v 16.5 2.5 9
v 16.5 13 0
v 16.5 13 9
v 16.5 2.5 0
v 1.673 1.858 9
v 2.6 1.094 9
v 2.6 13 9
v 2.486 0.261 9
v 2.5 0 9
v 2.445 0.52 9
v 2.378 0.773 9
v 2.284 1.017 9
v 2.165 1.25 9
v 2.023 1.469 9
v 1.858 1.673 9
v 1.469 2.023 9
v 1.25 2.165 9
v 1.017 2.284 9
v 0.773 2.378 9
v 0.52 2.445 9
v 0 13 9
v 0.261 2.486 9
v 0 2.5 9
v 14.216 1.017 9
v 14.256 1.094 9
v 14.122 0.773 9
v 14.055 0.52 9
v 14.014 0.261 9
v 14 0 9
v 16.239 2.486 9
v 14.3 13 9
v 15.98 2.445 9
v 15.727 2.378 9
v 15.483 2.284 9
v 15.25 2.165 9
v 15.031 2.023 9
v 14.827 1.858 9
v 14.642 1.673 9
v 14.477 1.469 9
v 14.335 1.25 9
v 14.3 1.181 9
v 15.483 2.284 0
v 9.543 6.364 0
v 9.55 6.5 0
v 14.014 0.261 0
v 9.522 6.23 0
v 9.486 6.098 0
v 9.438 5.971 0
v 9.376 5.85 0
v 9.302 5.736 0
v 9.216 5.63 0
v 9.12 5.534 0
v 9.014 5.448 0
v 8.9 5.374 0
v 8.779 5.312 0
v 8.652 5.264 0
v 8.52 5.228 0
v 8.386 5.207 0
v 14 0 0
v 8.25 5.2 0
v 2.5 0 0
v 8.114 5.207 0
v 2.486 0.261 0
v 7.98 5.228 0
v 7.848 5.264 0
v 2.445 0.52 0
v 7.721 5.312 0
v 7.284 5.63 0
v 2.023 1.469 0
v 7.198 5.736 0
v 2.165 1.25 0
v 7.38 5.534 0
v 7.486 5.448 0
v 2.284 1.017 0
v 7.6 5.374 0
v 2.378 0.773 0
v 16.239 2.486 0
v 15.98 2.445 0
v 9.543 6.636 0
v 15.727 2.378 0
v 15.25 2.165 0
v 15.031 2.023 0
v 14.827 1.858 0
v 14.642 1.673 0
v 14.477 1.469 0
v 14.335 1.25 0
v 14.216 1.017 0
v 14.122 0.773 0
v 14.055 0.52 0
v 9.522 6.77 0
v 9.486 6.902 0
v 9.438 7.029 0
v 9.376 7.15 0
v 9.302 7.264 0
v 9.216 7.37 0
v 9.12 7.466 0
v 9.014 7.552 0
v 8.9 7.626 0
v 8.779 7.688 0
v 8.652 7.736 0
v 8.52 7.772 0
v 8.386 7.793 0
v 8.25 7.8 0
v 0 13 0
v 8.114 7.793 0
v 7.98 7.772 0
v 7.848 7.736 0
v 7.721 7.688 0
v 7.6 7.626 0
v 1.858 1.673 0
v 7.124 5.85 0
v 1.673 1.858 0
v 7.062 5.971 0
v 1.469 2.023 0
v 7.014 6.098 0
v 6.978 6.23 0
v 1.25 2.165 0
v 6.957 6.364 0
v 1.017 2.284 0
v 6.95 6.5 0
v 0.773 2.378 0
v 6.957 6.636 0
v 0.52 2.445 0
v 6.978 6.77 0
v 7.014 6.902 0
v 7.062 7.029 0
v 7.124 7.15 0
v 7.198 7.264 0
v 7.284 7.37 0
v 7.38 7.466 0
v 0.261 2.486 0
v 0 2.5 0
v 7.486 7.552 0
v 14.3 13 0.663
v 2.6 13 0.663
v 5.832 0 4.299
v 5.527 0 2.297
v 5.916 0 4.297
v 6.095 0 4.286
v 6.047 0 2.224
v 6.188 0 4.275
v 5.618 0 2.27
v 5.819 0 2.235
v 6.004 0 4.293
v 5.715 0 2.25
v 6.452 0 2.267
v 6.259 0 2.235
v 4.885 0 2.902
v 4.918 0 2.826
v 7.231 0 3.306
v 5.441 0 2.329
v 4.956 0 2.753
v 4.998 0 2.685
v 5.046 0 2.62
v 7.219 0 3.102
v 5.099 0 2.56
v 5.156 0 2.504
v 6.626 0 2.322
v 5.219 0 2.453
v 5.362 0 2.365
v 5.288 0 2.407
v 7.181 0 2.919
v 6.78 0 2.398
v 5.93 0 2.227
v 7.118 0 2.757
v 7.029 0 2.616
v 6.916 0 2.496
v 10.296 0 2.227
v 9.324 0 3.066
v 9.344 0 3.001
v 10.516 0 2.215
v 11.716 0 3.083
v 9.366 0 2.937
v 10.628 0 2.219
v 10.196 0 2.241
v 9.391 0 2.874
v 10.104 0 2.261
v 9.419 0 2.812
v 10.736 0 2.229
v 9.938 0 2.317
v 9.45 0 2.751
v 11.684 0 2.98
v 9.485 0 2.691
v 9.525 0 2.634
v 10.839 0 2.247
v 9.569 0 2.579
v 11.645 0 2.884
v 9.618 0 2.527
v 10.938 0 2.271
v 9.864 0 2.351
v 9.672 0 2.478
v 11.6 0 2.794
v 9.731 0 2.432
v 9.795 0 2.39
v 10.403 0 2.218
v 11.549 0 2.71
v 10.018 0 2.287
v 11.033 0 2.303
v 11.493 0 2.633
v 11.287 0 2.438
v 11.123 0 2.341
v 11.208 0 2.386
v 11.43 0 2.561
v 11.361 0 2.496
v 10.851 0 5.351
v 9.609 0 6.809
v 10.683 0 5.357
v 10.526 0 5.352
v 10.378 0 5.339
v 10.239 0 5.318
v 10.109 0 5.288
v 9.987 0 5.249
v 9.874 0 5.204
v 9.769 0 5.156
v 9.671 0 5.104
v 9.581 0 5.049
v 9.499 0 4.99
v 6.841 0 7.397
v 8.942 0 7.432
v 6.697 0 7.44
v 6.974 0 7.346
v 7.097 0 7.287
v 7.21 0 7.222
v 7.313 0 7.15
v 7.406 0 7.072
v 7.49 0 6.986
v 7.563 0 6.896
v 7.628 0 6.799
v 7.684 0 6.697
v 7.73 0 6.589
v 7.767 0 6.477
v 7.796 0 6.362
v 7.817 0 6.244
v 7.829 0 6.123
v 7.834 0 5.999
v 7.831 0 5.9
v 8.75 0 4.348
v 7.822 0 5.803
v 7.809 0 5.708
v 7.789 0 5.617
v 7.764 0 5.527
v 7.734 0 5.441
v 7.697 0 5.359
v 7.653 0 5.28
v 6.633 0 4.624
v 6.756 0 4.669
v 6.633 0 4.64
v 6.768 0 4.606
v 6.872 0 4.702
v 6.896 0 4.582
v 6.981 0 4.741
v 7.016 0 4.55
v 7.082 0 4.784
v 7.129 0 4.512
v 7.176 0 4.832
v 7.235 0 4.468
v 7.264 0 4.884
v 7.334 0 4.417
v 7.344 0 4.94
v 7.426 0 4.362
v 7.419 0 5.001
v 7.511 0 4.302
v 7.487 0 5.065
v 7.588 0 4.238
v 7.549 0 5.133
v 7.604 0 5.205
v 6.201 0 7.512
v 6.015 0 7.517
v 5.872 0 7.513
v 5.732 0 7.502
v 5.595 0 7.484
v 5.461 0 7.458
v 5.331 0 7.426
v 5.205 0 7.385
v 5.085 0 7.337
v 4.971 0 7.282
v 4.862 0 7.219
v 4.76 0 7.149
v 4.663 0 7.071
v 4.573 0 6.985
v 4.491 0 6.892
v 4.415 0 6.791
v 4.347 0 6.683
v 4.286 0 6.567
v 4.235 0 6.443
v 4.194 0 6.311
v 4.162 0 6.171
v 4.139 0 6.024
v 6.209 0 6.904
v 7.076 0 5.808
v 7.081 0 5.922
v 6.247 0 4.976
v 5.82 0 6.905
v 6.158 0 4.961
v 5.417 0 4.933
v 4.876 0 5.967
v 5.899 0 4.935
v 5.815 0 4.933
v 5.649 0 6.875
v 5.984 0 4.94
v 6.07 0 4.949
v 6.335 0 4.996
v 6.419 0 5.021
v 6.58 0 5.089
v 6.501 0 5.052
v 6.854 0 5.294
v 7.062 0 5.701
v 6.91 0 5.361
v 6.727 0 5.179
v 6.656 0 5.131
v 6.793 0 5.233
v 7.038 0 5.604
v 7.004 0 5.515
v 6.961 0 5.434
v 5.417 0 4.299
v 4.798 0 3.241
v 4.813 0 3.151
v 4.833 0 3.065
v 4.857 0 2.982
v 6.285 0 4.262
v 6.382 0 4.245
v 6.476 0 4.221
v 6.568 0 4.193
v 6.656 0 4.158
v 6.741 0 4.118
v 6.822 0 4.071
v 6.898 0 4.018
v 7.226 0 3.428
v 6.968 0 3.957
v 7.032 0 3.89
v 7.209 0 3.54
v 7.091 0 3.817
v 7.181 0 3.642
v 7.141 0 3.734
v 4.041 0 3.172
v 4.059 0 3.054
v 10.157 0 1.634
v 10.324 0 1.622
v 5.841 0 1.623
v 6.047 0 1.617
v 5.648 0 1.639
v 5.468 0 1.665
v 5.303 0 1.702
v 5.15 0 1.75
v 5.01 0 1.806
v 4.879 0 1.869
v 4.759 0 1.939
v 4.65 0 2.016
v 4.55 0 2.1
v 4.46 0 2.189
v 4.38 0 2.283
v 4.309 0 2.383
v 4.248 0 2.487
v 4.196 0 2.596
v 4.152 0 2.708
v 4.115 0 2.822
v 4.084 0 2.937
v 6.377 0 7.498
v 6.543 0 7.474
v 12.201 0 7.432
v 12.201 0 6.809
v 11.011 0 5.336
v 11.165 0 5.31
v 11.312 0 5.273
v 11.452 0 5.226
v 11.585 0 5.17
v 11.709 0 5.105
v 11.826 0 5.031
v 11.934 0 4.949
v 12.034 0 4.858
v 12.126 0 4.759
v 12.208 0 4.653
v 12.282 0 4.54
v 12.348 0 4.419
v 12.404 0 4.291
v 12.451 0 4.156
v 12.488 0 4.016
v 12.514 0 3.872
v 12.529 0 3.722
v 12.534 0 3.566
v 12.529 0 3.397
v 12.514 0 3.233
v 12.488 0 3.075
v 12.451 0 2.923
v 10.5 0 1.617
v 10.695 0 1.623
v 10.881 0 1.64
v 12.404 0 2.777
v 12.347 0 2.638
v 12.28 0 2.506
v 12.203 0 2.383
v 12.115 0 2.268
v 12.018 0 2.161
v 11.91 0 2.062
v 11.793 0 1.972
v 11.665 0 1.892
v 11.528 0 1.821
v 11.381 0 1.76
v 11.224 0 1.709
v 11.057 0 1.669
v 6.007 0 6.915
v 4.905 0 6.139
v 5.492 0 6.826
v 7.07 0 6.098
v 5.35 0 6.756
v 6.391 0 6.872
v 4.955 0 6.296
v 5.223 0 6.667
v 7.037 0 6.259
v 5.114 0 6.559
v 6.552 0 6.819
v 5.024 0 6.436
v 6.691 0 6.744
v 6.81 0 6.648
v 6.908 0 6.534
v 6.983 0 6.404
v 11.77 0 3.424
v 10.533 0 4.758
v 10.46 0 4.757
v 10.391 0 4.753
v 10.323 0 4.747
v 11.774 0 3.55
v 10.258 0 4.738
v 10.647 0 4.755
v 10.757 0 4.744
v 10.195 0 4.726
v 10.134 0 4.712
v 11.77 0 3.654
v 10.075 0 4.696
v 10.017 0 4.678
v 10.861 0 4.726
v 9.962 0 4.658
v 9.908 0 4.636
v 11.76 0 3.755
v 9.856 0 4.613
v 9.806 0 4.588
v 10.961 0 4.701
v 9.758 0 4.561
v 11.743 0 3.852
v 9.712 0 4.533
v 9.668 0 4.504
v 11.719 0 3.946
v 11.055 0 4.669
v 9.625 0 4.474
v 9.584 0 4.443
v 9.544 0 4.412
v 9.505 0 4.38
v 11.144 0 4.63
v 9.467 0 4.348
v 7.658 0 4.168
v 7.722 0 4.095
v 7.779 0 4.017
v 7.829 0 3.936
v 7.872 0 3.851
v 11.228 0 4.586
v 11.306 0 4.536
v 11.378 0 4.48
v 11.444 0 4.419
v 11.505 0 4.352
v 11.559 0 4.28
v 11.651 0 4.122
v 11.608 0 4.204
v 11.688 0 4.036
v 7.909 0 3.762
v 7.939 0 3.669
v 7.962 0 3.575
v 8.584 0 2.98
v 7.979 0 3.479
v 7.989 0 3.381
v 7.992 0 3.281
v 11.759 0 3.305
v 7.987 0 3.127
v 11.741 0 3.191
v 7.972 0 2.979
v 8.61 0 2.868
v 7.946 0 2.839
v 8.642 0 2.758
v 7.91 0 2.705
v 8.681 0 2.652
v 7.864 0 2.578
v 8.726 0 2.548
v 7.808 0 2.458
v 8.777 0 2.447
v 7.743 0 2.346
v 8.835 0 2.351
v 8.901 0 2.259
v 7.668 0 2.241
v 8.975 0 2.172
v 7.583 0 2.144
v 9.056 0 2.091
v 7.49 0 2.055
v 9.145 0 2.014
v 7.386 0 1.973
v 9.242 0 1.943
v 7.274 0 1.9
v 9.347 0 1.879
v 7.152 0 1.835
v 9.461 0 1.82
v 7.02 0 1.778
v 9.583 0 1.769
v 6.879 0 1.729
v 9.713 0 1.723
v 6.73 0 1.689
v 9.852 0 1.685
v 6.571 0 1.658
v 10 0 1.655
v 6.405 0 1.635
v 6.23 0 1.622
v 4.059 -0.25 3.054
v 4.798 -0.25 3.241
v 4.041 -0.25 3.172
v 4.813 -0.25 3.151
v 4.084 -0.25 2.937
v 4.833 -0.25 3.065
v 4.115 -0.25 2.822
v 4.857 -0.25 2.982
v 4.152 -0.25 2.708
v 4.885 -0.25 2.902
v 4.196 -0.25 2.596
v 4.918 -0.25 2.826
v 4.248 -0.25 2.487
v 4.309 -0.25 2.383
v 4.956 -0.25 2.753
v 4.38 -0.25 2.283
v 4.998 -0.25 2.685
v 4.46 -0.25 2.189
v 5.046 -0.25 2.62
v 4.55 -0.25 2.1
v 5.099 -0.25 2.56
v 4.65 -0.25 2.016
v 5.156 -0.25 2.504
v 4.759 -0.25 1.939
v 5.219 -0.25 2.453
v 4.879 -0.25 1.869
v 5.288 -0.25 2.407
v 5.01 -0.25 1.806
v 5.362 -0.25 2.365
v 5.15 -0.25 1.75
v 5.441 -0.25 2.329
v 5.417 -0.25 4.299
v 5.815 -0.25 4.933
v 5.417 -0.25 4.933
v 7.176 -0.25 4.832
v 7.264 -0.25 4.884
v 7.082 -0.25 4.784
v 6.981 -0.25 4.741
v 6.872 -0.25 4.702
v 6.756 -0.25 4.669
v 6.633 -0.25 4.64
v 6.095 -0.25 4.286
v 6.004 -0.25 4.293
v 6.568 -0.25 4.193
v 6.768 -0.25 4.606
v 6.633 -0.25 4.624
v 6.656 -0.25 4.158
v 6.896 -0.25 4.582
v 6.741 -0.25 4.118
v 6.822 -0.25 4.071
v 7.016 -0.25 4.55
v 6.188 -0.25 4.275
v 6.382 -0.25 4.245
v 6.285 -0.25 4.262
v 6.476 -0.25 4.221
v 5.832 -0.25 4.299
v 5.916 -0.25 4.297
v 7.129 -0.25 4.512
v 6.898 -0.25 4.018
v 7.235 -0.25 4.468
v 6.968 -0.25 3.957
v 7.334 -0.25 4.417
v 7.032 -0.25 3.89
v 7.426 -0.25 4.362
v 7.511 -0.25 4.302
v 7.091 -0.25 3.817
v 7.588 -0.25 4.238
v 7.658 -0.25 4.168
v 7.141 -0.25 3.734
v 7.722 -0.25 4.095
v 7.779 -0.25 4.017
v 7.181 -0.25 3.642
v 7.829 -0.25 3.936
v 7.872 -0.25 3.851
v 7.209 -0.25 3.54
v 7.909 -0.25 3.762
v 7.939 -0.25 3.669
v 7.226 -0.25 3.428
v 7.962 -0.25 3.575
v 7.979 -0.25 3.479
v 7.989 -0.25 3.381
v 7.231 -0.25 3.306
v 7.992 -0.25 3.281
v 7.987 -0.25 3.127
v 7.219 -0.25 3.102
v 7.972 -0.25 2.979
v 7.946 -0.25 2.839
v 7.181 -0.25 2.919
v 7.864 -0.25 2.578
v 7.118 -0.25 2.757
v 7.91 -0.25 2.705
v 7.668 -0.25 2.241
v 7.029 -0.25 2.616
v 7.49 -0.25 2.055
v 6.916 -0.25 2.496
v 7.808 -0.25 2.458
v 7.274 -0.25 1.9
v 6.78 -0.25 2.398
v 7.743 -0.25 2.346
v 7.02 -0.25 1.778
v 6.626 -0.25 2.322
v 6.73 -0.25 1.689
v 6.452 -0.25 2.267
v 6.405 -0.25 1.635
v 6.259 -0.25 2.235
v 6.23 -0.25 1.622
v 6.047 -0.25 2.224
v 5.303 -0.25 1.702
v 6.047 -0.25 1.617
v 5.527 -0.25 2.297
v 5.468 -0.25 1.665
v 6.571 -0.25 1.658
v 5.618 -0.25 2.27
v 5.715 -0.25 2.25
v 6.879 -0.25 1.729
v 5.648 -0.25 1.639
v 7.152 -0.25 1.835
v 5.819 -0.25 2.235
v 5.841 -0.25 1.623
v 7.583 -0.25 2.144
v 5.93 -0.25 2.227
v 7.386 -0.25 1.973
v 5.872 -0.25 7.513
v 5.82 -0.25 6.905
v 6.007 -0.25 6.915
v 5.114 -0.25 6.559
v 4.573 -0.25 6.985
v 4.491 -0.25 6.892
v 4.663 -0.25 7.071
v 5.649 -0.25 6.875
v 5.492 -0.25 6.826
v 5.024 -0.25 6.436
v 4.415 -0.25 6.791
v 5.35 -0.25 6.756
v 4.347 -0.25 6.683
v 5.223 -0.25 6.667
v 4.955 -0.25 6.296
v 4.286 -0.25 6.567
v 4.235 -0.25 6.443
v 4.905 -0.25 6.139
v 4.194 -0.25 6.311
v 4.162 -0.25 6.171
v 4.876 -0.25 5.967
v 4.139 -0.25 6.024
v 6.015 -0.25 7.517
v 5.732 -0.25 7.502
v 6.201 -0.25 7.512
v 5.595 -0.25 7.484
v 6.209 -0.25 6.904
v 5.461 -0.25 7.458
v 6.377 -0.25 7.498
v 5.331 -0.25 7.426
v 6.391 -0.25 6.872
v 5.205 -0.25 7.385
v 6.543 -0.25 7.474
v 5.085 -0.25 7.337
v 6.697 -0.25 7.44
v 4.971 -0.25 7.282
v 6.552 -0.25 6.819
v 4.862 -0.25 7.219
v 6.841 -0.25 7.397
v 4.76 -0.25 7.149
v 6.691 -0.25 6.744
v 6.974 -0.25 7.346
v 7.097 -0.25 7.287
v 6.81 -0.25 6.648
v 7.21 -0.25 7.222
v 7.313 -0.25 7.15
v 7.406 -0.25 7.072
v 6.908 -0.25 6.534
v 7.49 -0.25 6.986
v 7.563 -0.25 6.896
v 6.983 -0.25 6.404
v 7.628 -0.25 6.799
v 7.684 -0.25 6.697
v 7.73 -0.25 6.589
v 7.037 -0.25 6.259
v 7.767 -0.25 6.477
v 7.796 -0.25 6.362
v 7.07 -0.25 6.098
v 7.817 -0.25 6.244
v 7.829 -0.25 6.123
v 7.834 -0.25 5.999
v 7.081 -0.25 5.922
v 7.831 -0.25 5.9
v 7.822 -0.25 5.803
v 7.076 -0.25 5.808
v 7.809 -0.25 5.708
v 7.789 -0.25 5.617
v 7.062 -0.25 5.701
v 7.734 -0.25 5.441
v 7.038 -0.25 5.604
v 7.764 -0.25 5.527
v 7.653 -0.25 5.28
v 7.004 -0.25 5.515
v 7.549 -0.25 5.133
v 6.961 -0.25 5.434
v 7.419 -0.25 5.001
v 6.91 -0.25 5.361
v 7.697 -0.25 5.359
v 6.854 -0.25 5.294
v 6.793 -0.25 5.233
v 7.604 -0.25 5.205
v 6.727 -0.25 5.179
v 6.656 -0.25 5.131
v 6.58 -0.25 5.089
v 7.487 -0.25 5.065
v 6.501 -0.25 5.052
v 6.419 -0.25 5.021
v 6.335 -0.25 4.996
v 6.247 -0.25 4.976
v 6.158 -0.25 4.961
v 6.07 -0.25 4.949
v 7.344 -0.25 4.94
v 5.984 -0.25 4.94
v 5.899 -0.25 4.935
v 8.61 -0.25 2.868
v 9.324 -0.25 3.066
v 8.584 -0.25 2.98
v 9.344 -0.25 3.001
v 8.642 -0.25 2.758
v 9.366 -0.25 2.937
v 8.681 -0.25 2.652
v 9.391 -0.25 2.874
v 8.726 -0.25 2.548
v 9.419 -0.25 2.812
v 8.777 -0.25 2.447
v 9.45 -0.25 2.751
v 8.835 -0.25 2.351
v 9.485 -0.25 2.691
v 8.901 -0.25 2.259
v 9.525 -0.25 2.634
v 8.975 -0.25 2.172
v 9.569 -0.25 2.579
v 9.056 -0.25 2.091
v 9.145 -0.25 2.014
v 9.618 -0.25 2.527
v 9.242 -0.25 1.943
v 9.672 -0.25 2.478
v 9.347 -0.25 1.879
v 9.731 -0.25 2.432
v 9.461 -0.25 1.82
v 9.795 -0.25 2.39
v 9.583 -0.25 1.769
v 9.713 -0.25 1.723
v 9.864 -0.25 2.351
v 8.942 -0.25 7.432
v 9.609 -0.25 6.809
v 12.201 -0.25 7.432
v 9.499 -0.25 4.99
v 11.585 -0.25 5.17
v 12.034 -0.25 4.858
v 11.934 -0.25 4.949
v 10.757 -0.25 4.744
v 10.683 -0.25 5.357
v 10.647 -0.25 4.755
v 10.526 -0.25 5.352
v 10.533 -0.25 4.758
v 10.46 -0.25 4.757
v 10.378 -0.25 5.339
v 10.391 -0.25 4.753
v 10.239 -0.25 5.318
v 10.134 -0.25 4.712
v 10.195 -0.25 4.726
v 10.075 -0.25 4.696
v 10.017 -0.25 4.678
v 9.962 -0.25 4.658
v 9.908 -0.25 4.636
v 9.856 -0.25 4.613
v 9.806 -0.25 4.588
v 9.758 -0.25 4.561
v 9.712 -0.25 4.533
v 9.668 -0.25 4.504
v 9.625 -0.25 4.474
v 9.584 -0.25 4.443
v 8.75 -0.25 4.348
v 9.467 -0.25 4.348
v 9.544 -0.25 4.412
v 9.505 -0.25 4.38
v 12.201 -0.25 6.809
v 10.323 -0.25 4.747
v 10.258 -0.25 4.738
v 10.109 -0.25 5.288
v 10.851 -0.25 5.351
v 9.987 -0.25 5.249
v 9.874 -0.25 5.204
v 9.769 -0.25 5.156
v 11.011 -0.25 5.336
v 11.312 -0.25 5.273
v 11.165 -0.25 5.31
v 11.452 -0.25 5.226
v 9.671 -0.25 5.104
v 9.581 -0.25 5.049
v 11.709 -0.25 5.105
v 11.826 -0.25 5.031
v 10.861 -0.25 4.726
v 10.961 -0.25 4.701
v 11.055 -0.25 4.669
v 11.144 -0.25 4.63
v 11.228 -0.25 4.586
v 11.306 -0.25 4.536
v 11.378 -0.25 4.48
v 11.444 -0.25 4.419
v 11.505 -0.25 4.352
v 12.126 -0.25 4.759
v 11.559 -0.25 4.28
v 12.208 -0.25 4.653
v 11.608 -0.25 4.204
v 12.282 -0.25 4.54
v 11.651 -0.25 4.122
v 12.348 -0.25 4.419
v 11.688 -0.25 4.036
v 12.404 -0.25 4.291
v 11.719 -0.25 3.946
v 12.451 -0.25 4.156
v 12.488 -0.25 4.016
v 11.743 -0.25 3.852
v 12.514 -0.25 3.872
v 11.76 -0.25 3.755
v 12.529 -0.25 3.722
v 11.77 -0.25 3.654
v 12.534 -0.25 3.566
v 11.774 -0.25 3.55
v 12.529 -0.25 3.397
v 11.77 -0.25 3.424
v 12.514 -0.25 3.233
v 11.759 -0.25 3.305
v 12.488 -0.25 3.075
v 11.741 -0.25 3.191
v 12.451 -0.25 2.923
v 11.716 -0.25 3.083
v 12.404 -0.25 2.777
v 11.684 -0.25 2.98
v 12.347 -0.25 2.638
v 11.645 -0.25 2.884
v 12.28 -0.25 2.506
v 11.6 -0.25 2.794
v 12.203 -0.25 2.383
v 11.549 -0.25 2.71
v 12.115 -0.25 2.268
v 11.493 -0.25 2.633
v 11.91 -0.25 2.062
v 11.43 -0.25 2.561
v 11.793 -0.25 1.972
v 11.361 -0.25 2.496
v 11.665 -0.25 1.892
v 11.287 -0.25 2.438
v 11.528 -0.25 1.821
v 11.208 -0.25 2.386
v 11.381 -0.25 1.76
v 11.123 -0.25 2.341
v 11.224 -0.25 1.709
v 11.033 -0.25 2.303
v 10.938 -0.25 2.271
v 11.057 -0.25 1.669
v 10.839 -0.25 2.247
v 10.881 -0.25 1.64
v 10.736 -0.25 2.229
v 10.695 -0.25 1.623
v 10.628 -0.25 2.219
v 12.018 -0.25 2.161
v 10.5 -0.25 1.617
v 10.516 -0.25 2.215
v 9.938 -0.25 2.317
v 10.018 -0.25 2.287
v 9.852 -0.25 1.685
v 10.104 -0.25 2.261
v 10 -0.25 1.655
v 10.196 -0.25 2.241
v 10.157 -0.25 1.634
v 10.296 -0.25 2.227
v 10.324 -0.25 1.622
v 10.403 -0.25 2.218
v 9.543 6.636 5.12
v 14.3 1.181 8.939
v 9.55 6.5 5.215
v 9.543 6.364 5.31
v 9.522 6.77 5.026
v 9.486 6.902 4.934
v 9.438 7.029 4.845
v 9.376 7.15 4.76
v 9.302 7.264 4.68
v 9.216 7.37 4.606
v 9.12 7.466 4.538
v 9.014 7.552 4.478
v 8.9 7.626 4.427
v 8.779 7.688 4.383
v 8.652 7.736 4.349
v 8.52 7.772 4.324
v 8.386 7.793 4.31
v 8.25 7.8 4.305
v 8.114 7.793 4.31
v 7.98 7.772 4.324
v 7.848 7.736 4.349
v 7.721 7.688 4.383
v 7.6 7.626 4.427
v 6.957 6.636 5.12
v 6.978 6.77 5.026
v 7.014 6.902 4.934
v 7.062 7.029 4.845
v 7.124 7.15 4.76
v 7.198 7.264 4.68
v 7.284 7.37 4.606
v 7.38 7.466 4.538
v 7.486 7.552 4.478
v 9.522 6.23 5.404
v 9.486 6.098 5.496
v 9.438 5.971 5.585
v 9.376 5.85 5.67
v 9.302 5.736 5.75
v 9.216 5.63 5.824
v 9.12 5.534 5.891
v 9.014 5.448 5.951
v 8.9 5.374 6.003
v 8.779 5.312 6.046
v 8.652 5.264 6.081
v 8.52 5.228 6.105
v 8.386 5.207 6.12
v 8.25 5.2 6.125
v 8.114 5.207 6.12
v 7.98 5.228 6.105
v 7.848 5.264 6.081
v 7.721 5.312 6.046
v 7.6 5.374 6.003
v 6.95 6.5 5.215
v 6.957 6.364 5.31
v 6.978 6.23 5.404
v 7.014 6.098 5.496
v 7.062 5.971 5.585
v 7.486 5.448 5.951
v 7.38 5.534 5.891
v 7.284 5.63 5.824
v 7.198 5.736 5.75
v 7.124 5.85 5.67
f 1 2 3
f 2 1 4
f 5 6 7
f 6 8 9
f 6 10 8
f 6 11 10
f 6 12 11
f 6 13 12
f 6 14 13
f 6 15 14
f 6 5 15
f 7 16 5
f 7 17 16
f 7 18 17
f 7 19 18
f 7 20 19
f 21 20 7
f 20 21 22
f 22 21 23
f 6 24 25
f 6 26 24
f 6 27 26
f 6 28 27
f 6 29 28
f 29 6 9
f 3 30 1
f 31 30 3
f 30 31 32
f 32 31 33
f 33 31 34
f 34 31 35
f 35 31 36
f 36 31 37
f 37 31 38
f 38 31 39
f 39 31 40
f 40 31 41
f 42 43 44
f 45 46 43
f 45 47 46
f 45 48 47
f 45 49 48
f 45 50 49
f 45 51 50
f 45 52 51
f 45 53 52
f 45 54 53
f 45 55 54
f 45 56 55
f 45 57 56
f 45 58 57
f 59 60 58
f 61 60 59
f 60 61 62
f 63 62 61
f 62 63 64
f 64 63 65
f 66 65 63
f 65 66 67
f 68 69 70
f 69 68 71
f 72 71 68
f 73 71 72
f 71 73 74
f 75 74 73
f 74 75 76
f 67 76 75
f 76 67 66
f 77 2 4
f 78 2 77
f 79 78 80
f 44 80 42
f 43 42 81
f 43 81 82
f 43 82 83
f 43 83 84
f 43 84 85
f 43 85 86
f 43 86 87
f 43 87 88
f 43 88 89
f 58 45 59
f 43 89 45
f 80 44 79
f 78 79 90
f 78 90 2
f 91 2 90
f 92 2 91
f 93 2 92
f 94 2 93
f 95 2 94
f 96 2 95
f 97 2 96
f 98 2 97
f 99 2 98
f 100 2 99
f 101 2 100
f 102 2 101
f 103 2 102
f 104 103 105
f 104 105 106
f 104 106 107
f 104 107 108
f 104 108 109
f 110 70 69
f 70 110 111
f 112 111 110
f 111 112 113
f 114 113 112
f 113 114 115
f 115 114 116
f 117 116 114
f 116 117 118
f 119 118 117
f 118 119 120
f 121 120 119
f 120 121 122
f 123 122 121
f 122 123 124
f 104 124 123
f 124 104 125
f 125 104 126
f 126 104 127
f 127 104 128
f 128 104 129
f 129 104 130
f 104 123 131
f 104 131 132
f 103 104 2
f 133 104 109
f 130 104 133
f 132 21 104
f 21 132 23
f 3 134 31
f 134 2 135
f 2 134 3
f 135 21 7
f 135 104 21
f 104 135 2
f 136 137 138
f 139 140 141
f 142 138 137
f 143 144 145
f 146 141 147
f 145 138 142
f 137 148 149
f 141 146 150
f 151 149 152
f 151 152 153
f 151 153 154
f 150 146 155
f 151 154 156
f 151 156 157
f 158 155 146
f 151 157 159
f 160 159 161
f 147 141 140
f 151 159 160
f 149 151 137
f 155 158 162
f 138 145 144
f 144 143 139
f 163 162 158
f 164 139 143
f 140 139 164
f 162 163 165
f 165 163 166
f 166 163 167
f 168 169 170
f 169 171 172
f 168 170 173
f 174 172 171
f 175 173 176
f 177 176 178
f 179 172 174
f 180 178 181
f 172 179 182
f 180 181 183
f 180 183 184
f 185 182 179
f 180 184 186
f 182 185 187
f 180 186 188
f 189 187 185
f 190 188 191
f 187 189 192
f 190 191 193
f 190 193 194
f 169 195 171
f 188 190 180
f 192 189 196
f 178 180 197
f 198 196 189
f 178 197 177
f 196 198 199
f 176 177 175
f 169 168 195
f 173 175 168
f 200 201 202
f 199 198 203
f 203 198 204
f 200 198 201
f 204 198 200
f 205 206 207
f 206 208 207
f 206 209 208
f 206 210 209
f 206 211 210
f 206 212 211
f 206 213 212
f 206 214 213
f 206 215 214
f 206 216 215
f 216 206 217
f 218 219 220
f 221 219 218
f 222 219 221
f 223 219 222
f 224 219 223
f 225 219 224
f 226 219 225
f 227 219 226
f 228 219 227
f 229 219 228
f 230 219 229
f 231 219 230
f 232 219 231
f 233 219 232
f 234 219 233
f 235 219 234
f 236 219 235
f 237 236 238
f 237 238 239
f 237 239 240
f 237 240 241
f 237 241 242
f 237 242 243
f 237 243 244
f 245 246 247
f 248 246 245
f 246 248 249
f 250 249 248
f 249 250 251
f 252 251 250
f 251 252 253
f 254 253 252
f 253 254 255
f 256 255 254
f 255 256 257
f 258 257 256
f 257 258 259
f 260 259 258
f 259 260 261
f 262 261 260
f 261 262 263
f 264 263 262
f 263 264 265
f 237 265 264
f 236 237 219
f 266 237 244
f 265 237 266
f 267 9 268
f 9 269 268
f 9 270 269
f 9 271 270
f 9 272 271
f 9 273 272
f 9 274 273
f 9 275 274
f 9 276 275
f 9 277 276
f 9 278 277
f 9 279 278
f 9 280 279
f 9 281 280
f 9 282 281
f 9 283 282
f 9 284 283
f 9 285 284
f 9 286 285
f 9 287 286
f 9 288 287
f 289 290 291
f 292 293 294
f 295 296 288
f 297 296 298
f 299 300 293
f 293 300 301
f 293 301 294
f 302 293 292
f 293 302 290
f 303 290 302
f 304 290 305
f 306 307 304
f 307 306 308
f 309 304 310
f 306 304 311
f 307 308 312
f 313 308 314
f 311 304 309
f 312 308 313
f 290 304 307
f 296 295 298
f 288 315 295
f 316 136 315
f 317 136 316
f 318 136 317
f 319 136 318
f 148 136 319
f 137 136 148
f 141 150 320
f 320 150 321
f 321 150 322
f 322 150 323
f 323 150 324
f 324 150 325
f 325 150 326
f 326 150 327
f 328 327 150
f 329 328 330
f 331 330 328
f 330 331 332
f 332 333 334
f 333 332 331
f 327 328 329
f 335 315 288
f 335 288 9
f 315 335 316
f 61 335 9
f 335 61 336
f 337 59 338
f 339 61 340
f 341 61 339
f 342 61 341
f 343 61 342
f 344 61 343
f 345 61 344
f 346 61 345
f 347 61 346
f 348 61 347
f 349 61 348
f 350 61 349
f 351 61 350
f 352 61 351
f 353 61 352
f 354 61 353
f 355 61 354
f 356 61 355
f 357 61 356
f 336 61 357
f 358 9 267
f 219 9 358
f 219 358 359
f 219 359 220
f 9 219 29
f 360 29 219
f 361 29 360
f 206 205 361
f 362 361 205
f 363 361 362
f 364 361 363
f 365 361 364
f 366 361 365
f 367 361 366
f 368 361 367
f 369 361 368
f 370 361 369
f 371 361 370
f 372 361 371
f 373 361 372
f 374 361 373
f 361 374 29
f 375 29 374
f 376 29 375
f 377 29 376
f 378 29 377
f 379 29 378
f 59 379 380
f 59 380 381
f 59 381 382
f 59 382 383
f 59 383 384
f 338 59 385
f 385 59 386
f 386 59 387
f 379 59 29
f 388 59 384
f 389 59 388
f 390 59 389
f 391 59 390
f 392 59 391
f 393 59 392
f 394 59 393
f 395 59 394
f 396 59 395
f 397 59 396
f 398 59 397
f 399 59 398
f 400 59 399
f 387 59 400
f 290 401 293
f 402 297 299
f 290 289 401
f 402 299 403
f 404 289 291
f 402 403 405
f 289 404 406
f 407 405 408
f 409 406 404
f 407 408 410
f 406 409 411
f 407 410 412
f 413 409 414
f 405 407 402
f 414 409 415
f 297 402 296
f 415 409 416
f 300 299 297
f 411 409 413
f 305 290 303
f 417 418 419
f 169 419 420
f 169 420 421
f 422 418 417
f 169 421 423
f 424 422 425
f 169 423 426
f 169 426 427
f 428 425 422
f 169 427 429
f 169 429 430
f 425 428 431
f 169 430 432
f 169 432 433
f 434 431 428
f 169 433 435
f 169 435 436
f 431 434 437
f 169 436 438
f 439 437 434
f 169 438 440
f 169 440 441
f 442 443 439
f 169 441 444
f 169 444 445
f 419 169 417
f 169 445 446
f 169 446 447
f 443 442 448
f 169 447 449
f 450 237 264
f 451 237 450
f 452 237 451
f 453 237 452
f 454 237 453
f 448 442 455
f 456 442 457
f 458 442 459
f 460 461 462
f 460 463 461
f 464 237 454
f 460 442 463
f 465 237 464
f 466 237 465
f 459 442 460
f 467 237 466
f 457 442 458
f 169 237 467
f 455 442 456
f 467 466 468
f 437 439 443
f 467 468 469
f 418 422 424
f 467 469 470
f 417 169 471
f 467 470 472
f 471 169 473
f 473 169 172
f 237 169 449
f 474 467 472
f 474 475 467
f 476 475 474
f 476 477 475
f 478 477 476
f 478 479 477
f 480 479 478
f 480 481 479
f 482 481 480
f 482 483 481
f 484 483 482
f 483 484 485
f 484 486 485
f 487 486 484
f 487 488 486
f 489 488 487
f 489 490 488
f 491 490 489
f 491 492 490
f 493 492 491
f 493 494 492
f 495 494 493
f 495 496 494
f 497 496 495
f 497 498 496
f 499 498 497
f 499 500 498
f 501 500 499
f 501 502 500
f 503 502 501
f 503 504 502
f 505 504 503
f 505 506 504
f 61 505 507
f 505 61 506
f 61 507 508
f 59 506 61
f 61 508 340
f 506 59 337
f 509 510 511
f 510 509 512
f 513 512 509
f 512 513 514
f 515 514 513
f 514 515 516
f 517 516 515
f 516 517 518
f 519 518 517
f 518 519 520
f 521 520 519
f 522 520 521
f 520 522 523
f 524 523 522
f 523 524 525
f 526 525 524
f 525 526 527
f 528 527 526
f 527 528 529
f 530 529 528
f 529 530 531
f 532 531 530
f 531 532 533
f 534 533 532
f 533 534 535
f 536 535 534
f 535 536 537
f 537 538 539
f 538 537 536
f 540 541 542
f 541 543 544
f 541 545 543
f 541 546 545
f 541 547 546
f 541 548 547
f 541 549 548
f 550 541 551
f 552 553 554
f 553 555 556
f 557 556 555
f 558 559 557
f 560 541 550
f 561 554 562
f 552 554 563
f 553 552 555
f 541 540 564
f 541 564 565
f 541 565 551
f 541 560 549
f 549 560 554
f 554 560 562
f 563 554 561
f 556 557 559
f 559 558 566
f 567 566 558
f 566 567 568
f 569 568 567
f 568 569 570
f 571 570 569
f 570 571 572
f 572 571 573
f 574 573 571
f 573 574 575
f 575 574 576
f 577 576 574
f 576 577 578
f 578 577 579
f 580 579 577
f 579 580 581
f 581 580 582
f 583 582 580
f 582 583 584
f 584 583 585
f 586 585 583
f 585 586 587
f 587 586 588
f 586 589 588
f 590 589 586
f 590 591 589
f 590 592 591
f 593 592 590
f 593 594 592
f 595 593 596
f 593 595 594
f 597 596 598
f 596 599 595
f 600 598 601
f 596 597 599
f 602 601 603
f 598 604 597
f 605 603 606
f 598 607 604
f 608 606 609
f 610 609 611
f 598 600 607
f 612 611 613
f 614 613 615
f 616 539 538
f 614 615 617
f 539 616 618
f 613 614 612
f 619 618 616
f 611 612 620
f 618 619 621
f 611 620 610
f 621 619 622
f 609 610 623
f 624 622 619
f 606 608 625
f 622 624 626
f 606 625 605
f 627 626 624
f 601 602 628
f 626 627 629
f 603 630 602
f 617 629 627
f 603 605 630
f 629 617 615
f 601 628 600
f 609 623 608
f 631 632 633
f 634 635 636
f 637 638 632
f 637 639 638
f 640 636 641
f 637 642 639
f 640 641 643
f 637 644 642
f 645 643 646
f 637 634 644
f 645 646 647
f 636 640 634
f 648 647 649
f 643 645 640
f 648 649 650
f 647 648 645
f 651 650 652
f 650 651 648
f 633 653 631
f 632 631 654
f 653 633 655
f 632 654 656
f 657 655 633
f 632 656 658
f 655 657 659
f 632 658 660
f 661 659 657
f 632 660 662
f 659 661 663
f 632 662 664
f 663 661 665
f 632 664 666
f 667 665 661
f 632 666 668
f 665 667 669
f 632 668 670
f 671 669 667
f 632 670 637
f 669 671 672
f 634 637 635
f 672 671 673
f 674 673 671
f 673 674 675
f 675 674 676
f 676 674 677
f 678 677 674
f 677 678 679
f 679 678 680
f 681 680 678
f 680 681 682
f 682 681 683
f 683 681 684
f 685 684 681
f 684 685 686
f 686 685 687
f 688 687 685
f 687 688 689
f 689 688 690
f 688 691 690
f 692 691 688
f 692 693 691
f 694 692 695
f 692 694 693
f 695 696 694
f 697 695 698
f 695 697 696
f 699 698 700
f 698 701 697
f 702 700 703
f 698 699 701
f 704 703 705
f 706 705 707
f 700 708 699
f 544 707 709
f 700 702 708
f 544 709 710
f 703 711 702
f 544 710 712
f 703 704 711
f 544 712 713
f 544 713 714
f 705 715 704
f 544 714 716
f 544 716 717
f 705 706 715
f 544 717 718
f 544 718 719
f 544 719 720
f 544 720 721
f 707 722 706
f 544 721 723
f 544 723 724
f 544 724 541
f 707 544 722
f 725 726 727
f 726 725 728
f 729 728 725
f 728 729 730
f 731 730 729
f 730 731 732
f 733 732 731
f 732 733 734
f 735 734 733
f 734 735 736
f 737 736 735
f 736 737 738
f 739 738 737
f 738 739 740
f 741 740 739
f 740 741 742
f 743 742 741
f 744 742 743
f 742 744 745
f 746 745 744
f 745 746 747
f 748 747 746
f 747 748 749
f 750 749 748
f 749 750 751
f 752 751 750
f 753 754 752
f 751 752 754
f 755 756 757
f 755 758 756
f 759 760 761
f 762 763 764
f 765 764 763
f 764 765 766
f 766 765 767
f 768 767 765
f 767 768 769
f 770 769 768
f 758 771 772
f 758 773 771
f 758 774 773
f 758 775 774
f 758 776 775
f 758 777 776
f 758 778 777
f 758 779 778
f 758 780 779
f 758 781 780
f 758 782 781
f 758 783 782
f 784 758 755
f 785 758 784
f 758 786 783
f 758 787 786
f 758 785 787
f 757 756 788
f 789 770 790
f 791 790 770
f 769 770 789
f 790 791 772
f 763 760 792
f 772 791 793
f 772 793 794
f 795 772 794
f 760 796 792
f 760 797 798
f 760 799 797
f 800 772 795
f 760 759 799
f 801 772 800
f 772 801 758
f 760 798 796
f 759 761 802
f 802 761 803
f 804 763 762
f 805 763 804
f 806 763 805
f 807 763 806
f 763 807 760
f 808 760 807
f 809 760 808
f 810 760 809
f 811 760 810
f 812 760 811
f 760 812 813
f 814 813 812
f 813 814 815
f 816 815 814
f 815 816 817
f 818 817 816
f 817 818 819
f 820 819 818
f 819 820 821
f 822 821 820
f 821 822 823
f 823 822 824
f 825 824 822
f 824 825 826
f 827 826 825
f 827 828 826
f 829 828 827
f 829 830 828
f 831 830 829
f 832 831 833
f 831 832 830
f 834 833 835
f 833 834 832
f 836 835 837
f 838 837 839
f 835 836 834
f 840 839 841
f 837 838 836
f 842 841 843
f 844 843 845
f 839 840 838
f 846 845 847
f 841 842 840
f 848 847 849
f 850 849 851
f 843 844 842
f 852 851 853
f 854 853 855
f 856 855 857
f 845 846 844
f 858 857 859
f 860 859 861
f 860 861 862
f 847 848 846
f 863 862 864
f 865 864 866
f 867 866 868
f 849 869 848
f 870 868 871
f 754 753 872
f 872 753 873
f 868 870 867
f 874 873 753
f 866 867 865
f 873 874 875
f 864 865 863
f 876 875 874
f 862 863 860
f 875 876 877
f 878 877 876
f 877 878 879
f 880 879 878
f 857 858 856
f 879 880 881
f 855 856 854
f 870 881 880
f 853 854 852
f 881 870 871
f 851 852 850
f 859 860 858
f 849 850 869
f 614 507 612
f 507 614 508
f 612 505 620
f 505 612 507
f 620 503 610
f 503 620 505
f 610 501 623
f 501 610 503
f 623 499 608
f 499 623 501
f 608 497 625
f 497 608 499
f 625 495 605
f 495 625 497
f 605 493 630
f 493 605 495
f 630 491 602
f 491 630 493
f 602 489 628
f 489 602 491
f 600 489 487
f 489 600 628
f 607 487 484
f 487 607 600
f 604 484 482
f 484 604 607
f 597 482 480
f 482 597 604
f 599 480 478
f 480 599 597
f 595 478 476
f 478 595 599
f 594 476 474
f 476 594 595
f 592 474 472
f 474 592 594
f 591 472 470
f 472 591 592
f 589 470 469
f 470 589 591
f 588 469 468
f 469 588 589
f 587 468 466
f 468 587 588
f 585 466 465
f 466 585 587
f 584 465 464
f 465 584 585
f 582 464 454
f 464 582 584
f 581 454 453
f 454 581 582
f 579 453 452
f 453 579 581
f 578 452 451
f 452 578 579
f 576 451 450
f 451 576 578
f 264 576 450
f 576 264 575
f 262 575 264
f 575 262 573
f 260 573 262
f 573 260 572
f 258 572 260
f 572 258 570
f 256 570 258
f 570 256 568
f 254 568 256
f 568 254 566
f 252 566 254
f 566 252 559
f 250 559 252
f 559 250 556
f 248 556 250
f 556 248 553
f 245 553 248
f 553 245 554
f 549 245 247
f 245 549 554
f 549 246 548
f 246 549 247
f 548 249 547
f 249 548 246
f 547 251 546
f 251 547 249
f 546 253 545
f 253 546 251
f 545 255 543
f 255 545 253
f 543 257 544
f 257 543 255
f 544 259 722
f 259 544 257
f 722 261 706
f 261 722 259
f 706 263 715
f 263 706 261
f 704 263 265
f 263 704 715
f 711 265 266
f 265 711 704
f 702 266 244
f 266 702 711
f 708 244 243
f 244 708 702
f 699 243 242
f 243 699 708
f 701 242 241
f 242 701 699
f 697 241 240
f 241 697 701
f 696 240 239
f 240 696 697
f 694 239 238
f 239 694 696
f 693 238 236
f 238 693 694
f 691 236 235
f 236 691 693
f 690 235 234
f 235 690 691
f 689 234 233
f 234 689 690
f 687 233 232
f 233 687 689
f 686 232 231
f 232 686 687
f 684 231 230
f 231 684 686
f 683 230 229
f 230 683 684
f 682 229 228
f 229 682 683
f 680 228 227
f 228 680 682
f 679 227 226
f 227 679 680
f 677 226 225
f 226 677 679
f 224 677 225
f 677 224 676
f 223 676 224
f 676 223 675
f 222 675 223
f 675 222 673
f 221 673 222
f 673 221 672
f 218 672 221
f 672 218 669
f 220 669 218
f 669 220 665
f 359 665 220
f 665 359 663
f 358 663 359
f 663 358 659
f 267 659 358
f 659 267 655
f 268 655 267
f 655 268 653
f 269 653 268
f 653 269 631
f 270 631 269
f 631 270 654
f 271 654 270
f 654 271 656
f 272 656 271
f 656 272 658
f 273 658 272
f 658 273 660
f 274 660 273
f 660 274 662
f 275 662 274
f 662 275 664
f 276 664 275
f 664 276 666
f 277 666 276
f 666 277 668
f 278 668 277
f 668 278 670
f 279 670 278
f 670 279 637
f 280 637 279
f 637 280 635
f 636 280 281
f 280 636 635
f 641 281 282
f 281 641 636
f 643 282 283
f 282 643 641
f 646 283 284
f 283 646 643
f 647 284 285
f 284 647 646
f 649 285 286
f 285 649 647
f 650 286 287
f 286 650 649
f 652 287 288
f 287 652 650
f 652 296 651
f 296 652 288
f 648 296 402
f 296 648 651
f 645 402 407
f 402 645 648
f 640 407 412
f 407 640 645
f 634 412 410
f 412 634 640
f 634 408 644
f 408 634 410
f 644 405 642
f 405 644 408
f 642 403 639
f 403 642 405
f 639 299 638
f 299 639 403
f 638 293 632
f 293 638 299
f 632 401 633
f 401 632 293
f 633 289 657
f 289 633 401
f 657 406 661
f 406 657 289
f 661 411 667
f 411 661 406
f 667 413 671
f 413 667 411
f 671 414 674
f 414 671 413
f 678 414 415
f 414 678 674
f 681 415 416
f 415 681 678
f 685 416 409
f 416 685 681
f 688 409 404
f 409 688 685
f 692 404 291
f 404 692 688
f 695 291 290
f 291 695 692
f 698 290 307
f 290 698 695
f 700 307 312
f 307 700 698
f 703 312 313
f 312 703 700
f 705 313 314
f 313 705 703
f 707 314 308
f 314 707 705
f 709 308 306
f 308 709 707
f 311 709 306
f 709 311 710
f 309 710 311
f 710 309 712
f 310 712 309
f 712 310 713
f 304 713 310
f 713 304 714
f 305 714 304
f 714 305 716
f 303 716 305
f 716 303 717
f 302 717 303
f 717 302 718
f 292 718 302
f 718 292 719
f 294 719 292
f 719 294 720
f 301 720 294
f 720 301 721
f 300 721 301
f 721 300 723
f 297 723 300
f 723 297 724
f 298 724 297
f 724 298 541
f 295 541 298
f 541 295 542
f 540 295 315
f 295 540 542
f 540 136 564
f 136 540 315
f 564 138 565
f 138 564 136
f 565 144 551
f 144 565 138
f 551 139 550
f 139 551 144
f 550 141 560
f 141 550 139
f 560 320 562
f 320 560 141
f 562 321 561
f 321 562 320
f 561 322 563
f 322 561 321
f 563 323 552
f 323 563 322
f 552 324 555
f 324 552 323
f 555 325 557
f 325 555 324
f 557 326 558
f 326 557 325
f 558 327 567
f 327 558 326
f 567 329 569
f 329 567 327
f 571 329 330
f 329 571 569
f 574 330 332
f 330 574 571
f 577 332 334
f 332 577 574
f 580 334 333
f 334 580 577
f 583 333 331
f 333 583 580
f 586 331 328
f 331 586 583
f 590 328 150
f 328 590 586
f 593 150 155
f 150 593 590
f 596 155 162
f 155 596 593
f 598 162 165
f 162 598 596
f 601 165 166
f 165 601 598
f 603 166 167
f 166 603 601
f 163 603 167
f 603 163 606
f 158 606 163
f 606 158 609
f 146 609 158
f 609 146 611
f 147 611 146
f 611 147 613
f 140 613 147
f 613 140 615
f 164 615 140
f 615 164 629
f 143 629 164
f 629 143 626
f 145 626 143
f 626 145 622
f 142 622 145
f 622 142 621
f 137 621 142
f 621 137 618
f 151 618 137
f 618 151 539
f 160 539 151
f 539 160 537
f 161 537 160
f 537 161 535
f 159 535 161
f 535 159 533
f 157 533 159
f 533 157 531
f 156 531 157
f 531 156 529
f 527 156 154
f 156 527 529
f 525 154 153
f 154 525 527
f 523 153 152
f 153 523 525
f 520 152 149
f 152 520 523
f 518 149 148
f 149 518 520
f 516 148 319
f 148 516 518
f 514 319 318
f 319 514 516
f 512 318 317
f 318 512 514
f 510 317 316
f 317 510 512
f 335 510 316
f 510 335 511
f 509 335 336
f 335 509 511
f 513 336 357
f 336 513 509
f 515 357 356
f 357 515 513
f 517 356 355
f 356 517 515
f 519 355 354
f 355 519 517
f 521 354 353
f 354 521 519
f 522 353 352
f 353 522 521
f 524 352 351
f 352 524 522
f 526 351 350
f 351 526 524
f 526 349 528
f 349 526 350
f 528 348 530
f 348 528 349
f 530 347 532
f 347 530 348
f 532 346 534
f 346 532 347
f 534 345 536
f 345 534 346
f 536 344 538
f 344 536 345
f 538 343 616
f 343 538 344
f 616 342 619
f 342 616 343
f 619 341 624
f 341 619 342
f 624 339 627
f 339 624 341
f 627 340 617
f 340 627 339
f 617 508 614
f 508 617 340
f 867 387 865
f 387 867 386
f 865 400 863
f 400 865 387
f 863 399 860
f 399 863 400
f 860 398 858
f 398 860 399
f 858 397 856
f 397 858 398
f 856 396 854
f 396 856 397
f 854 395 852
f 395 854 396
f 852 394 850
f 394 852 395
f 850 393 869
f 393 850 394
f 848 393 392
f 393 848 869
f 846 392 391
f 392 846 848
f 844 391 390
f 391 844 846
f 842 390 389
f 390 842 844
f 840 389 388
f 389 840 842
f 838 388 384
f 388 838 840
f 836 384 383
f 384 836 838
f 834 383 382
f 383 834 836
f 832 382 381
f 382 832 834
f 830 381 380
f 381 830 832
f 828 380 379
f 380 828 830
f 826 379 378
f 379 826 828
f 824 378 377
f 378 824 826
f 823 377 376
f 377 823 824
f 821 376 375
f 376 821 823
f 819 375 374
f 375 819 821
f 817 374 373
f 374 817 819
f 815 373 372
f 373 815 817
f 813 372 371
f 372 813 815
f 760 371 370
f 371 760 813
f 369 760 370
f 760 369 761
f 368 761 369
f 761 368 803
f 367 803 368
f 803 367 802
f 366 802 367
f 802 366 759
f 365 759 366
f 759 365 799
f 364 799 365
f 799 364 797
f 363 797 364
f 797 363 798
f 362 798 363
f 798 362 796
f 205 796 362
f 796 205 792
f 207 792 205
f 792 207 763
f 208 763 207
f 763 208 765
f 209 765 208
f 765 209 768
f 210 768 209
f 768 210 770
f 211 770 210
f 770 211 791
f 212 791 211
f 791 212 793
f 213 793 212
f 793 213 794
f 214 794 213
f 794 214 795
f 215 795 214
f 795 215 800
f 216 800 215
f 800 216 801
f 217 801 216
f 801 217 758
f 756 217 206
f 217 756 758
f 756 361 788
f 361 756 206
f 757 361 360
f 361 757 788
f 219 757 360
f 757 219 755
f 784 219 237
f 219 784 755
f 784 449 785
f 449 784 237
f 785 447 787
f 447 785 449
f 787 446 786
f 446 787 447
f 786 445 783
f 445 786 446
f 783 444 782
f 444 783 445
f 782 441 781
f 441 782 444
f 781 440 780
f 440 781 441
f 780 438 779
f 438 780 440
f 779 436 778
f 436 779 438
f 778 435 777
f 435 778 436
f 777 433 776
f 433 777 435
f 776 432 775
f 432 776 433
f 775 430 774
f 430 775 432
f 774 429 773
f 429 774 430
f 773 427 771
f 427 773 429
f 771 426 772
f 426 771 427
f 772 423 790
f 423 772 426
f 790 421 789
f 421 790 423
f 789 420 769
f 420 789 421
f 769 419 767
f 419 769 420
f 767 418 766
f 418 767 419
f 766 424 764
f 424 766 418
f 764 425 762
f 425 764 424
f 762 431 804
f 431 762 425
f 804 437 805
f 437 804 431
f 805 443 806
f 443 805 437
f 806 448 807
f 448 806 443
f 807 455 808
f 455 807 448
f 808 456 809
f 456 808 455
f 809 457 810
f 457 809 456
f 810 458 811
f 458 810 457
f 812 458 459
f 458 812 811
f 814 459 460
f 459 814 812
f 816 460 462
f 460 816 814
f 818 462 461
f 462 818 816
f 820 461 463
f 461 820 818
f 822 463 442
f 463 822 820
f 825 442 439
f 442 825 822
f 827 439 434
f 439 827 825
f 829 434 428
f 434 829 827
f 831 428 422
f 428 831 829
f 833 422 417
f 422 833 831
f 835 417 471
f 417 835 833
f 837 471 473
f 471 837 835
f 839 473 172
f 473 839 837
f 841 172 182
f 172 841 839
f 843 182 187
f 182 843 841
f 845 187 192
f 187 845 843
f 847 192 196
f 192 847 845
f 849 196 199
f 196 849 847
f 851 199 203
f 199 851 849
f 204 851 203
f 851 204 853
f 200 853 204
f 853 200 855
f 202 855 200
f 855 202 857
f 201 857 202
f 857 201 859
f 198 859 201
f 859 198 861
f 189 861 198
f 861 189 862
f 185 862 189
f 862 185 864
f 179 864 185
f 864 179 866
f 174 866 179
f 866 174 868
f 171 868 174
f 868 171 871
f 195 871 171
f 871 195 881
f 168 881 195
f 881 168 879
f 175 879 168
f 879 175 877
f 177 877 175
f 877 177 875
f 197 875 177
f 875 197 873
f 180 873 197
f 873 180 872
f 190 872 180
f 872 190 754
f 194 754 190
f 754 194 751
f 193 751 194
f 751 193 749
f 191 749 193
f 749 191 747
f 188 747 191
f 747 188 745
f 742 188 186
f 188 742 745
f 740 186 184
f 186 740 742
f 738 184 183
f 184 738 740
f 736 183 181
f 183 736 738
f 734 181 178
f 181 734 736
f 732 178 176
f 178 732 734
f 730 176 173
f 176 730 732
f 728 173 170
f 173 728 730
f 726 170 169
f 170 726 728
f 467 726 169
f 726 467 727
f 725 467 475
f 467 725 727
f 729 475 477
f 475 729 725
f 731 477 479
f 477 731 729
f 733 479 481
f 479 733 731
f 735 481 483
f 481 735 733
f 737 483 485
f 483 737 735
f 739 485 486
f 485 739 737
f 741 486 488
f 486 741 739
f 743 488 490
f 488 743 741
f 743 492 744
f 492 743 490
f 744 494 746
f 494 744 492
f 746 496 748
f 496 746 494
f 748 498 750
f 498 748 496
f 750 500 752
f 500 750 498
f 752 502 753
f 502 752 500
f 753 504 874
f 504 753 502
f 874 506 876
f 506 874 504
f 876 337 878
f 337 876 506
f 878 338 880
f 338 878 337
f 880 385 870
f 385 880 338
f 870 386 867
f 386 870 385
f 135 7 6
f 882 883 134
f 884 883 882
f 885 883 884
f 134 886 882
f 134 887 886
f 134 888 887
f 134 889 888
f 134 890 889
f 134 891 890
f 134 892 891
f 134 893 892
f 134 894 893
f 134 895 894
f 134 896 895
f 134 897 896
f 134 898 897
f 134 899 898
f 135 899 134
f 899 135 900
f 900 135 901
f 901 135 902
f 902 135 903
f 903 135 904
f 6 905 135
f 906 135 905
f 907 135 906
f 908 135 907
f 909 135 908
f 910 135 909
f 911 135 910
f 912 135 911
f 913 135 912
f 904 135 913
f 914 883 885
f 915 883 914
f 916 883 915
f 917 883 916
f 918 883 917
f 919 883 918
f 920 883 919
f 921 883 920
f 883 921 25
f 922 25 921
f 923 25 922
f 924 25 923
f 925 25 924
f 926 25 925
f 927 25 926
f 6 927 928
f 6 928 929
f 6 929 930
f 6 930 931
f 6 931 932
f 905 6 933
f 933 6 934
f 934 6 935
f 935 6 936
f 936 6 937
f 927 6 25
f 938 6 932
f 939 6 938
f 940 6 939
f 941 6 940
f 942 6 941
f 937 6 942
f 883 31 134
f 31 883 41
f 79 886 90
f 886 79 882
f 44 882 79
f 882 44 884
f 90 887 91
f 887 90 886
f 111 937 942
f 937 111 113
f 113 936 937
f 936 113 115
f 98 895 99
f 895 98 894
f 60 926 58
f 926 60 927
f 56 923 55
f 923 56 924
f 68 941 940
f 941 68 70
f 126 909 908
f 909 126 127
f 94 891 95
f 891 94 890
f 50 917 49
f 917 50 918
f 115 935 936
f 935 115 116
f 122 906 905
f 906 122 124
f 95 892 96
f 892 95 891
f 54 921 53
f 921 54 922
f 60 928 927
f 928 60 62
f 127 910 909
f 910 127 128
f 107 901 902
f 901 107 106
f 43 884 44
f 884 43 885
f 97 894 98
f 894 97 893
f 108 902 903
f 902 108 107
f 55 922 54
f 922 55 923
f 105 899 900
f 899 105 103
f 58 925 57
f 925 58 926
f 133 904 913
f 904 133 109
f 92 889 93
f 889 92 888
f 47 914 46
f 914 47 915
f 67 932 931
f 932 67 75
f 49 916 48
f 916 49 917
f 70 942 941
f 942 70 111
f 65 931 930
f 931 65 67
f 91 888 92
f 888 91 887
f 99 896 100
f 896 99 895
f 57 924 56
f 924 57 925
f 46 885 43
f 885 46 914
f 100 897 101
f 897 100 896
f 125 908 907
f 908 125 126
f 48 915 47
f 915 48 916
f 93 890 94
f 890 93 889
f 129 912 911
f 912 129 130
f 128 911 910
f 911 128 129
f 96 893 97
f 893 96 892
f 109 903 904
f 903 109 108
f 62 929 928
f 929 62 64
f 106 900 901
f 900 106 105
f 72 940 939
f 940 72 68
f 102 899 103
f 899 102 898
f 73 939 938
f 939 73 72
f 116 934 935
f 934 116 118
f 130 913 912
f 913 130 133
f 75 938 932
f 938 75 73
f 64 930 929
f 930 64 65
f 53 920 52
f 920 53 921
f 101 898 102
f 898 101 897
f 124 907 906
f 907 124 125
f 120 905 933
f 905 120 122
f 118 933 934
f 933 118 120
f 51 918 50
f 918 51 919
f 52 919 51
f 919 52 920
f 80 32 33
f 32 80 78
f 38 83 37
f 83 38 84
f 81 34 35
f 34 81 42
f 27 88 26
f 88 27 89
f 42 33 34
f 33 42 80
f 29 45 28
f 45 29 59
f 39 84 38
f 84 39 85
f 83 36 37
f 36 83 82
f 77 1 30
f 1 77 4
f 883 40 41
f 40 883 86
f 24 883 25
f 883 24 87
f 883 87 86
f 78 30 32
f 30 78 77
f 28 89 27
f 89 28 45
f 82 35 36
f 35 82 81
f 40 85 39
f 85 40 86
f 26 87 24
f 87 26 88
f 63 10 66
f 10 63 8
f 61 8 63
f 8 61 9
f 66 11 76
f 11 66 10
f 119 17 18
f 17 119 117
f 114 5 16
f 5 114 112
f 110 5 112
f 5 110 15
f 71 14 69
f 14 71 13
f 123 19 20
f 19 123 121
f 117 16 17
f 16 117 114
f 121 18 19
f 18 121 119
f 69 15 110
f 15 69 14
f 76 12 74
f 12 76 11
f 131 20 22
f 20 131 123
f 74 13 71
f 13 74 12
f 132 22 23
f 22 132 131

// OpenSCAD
// customizer

//CUSTOMIZER VARIABLES

// The width of the mount - recommend 16.5
mount_width=16.5; // [15,15.5,16,16.5,17,17.5]

// longitudinal length of the mount - recommend 13
mount_length=13; // [12,13,14,15,16]

// height of the mount - recommend 9
mount_height=9; // [8,9,10,11,12,13]

// angle of the camera - recommend 10-35
angle_mount=35;  // [0:60]

// measured width of your camera's body - for example: 11.3 for XAT520
camera_width=11.3; // [11,11.1,11.2,11.3,11.4,11.5,11.6,11.7,11.8,11.9,12]

// height of angle numbers on front - recommend .25
letter_height=.25;  // [.15,.25,.35,.45]

// size of angle numbers - recommend 1.5
letter_size=mount_height/1.5;  // [1,1.25,1.5,1.75,2]


//font = "Liberation Sans";

//if must fit between posts, recommend 2.5.  0 will eliminate the cutout
post_radius=2.5;  // [0,1,1.5,2,2.5,3,3.5]

// adjustment to height of camera setting - recommend 8
height_adjustment=8;  // [7,7.5,8,8.5,9,9.5]

/*hidden*/

camera_length=40*1;

wall_thickness=(mount_width-camera_width)/2; 

module letter(msg){
	linear_extrude(height = letter_height) {
	text(str(angle_mount), size = letter_size, halign = "center", valign = "center", $fn = 32);
	}
} 

module mount(){// basic mount cube and the letters, from which "cutouts" will be made
cube ([mount_width, mount_length, mount_height]);
    color("black")
    translate([mount_width/2, 0, mount_height/2]) rotate([90, 0, 0]) letter(str(angle_mount));
}

module tube(){  //this is the camera body to cut out from mount
cube ([camera_width+.4, 11.3, camera_length]); //accounts for extruder width of.4mm to size actual measurement for fit

}
module hole(){  // mounting hole... you may change the diameter/radius to fit your bolt/screw
    cylinder($fa=5, $fn=60, $fs=1, r1=1.3,r2=1.3,45);
}

module post(){  // some micros have posts between horizontal bodies which may interfere with mounting, if so this "notches" the mount to allow it to slide forward for mounting between the posts.
    cylinder($fn=60,r1=post_radius,r2=post_radius,45);
}

difference(){
mount();
rotate([90-angle_mount,0,0])
translate([wall_thickness,height_adjustment,-(camera_length/2)-mount_height]){tube();}
translate([mount_width/2,mount_length/2,-15]){hole();}
translate([mount_width,0,-15]){post();}
translate([0,0,-15]){post();}
}
